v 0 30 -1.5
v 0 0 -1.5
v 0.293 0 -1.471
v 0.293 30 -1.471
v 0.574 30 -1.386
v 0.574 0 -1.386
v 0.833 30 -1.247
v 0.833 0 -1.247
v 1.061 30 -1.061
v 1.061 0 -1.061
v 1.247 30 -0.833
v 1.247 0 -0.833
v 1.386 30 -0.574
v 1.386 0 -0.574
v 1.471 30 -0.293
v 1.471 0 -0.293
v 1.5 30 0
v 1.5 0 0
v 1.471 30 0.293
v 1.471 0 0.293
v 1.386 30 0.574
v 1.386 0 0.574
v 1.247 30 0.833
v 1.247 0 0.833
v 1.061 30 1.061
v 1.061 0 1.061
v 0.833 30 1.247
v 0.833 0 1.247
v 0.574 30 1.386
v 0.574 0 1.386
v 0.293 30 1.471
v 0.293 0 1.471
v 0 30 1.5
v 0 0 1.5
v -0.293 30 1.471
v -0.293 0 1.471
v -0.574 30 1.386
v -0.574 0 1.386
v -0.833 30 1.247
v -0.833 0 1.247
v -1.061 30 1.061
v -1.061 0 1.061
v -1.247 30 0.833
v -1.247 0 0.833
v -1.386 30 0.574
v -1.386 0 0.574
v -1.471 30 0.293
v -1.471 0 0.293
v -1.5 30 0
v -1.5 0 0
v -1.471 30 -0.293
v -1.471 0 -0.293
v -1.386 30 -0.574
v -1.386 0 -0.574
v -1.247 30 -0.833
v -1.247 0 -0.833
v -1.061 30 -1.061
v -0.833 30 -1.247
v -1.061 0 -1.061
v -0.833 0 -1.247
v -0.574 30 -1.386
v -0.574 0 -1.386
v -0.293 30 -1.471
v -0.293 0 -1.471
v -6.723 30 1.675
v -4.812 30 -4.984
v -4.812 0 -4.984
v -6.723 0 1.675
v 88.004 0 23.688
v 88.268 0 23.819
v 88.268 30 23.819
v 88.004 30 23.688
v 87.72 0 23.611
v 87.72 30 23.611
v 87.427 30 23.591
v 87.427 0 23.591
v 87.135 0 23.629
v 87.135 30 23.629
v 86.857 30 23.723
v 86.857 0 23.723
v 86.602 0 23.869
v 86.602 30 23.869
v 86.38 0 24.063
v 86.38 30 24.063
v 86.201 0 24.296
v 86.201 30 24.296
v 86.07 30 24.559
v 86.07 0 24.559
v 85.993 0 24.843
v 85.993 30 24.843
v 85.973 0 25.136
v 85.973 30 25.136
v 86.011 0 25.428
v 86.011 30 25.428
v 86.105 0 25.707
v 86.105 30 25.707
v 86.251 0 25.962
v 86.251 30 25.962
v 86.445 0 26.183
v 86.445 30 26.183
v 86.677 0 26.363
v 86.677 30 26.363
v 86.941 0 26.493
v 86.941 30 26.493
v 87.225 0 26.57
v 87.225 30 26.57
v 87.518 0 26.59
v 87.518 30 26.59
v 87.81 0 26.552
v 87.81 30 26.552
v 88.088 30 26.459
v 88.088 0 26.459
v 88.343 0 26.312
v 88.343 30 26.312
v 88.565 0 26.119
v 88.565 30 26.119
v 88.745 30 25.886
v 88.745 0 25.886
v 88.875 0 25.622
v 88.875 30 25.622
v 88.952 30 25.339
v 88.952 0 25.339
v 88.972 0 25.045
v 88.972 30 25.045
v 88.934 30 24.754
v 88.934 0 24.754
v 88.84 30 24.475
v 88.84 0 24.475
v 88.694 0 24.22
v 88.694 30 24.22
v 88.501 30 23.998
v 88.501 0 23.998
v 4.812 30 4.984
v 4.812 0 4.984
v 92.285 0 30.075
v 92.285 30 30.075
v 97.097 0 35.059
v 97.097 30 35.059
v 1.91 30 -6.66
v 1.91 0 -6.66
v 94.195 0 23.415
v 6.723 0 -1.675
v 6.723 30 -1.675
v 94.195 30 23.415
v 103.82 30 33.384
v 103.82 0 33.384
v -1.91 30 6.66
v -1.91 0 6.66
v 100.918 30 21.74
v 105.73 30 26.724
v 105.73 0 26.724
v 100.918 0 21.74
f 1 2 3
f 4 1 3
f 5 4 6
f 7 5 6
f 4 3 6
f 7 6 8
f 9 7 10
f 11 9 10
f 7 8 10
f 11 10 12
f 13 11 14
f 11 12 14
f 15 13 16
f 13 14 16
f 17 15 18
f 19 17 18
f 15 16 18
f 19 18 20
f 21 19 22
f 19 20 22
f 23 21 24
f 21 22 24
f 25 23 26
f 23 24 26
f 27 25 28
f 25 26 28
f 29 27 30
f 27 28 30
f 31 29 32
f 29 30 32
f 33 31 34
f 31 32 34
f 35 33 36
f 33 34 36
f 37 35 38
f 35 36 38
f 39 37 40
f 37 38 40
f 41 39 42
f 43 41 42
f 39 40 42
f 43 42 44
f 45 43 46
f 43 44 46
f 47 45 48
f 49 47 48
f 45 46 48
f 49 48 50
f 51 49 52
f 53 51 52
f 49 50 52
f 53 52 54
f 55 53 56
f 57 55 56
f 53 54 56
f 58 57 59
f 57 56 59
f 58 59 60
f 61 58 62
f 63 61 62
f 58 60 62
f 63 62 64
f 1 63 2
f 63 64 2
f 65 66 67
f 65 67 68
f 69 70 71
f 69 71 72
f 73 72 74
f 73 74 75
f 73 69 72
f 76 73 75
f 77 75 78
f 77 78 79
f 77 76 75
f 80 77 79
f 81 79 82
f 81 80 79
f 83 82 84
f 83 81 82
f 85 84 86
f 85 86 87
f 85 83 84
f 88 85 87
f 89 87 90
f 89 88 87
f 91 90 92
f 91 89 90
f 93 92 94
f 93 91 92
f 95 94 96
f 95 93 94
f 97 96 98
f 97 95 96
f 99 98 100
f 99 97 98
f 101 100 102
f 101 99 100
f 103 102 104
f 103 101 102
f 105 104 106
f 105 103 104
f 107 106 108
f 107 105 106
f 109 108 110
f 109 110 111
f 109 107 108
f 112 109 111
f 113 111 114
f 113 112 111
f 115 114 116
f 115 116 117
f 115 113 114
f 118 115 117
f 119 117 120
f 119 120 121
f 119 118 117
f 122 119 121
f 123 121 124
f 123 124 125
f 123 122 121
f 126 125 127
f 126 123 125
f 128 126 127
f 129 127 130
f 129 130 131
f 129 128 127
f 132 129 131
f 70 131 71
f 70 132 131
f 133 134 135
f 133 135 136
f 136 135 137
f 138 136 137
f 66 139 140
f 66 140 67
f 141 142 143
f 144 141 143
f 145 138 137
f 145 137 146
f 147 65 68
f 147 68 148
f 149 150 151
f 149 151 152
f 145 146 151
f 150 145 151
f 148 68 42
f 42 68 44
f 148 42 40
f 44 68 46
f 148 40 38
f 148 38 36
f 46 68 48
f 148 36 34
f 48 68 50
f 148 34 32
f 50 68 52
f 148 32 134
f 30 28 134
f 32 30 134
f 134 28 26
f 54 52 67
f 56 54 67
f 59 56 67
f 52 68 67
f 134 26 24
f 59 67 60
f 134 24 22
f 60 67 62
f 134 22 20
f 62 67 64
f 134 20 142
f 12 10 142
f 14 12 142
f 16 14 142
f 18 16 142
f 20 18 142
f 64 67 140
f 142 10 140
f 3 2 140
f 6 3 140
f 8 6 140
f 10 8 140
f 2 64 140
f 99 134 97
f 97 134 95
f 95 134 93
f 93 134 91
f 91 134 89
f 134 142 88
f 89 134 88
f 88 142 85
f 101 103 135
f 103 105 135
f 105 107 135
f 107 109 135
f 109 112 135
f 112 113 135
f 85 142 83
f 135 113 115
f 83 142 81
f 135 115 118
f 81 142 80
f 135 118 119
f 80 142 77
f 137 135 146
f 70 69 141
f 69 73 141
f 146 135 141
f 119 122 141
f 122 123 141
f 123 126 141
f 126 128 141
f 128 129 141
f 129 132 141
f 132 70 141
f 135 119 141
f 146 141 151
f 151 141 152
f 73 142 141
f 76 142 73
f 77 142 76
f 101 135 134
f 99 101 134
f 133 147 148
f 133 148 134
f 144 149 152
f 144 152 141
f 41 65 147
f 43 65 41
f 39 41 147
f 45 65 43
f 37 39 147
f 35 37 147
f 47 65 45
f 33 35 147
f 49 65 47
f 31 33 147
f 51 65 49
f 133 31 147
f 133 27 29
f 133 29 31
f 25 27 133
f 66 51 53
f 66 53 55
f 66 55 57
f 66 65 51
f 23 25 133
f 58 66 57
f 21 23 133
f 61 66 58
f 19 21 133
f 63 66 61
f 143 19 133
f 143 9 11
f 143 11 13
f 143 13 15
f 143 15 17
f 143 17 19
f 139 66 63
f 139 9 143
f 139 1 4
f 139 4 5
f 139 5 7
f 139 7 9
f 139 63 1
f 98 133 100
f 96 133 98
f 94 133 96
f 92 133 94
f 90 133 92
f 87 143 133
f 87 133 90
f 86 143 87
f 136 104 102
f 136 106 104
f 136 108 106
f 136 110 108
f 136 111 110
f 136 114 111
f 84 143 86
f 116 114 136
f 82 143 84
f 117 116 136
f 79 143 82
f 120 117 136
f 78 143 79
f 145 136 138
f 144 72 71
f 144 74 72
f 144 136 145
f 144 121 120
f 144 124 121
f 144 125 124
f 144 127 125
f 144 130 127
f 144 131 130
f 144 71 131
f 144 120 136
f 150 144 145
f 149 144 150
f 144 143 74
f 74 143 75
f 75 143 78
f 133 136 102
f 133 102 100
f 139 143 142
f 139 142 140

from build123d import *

# Parameters (mm, degrees)
RESSALTO_EXTRUS_O1_DEPTH = 30
ESBO_O2_R                = 1.5
CORTE_EXTRUS_O1_DEPTH    = 30
ESBO_O4_W                = 6.92820323
ESBO_O4_H                = 30
RESSALTO_EXTRUS_O2_DEPTH = 91
RESSALTO_EXTRUS_O3_DEPTH = 30


with BuildPart() as part:
    # Esboço1 → Ressalto-extrusão1 (new body)
    with BuildSketch(Plane(origin=(0, 0, 0), x_dir=(1, 0, 0), z_dir=(0, 1, 0))):
        Polygon((4.812291954, -4.984159523), (6.72255474, 1.675487321), (1.910262787, 6.659646844), (-4.812291954, 4.984159523), (-6.72255474, -1.675487321), (-1.910262787, -6.659646844), align=None)
    extrude(amount=RESSALTO_EXTRUS_O1_DEPTH)

    # Esboço2 → Corte-extrusão1 (cut)
    with BuildSketch(Plane.XZ):
        with Locations(Location((0, 0, 0), (0, 0, 270))):
            Circle(ESBO_O2_R)
    corte_extrus_o1 = extrude(amount=-CORTE_EXTRUS_O1_DEPTH, mode=Mode.SUBTRACT)

    # Esboço4 → Ressalto-extrusão2 (add)
    with BuildSketch(Plane(origin=(5.767423347, 0, 1.654336101), x_dir=(0.27572268356451307, 0, -0.961237224501831), z_dir=(0.961237224501831, 0, 0.27572268356451307))):
        with Locations((0, 15)):
            Rectangle(ESBO_O4_W, ESBO_O4_H)
    extrude(amount=RESSALTO_EXTRUS_O2_DEPTH)

    # Esboço5 → Ressalto-extrusão3 (add, through all)
    with BuildSketch(Plane(origin=(0, 0, 0), x_dir=(1, 0, 0), z_dir=(0, 1, 0))):
        Polygon((105.729988864, -26.723949087), (100.917696911, -21.739789563), (94.19514217, -23.415276884), (92.284879383, -30.074923728), (97.097171337, -35.059083251), (103.819726077, -33.38359593), align=None)
    extrude(amount=RESSALTO_EXTRUS_O3_DEPTH)

    # Espelhar1: Corte-extrusão1 across plane
    add(corte_extrus_o1.mirror(Plane(origin=(43.736293715, 0, 12.545382102), x_dir=(-0.2757226835645132, 0, 0.9612372245018309), z_dir=(-0.961237224501831, 0, -0.2757226835645132))), mode=Mode.SUBTRACT)


solid = part.part
